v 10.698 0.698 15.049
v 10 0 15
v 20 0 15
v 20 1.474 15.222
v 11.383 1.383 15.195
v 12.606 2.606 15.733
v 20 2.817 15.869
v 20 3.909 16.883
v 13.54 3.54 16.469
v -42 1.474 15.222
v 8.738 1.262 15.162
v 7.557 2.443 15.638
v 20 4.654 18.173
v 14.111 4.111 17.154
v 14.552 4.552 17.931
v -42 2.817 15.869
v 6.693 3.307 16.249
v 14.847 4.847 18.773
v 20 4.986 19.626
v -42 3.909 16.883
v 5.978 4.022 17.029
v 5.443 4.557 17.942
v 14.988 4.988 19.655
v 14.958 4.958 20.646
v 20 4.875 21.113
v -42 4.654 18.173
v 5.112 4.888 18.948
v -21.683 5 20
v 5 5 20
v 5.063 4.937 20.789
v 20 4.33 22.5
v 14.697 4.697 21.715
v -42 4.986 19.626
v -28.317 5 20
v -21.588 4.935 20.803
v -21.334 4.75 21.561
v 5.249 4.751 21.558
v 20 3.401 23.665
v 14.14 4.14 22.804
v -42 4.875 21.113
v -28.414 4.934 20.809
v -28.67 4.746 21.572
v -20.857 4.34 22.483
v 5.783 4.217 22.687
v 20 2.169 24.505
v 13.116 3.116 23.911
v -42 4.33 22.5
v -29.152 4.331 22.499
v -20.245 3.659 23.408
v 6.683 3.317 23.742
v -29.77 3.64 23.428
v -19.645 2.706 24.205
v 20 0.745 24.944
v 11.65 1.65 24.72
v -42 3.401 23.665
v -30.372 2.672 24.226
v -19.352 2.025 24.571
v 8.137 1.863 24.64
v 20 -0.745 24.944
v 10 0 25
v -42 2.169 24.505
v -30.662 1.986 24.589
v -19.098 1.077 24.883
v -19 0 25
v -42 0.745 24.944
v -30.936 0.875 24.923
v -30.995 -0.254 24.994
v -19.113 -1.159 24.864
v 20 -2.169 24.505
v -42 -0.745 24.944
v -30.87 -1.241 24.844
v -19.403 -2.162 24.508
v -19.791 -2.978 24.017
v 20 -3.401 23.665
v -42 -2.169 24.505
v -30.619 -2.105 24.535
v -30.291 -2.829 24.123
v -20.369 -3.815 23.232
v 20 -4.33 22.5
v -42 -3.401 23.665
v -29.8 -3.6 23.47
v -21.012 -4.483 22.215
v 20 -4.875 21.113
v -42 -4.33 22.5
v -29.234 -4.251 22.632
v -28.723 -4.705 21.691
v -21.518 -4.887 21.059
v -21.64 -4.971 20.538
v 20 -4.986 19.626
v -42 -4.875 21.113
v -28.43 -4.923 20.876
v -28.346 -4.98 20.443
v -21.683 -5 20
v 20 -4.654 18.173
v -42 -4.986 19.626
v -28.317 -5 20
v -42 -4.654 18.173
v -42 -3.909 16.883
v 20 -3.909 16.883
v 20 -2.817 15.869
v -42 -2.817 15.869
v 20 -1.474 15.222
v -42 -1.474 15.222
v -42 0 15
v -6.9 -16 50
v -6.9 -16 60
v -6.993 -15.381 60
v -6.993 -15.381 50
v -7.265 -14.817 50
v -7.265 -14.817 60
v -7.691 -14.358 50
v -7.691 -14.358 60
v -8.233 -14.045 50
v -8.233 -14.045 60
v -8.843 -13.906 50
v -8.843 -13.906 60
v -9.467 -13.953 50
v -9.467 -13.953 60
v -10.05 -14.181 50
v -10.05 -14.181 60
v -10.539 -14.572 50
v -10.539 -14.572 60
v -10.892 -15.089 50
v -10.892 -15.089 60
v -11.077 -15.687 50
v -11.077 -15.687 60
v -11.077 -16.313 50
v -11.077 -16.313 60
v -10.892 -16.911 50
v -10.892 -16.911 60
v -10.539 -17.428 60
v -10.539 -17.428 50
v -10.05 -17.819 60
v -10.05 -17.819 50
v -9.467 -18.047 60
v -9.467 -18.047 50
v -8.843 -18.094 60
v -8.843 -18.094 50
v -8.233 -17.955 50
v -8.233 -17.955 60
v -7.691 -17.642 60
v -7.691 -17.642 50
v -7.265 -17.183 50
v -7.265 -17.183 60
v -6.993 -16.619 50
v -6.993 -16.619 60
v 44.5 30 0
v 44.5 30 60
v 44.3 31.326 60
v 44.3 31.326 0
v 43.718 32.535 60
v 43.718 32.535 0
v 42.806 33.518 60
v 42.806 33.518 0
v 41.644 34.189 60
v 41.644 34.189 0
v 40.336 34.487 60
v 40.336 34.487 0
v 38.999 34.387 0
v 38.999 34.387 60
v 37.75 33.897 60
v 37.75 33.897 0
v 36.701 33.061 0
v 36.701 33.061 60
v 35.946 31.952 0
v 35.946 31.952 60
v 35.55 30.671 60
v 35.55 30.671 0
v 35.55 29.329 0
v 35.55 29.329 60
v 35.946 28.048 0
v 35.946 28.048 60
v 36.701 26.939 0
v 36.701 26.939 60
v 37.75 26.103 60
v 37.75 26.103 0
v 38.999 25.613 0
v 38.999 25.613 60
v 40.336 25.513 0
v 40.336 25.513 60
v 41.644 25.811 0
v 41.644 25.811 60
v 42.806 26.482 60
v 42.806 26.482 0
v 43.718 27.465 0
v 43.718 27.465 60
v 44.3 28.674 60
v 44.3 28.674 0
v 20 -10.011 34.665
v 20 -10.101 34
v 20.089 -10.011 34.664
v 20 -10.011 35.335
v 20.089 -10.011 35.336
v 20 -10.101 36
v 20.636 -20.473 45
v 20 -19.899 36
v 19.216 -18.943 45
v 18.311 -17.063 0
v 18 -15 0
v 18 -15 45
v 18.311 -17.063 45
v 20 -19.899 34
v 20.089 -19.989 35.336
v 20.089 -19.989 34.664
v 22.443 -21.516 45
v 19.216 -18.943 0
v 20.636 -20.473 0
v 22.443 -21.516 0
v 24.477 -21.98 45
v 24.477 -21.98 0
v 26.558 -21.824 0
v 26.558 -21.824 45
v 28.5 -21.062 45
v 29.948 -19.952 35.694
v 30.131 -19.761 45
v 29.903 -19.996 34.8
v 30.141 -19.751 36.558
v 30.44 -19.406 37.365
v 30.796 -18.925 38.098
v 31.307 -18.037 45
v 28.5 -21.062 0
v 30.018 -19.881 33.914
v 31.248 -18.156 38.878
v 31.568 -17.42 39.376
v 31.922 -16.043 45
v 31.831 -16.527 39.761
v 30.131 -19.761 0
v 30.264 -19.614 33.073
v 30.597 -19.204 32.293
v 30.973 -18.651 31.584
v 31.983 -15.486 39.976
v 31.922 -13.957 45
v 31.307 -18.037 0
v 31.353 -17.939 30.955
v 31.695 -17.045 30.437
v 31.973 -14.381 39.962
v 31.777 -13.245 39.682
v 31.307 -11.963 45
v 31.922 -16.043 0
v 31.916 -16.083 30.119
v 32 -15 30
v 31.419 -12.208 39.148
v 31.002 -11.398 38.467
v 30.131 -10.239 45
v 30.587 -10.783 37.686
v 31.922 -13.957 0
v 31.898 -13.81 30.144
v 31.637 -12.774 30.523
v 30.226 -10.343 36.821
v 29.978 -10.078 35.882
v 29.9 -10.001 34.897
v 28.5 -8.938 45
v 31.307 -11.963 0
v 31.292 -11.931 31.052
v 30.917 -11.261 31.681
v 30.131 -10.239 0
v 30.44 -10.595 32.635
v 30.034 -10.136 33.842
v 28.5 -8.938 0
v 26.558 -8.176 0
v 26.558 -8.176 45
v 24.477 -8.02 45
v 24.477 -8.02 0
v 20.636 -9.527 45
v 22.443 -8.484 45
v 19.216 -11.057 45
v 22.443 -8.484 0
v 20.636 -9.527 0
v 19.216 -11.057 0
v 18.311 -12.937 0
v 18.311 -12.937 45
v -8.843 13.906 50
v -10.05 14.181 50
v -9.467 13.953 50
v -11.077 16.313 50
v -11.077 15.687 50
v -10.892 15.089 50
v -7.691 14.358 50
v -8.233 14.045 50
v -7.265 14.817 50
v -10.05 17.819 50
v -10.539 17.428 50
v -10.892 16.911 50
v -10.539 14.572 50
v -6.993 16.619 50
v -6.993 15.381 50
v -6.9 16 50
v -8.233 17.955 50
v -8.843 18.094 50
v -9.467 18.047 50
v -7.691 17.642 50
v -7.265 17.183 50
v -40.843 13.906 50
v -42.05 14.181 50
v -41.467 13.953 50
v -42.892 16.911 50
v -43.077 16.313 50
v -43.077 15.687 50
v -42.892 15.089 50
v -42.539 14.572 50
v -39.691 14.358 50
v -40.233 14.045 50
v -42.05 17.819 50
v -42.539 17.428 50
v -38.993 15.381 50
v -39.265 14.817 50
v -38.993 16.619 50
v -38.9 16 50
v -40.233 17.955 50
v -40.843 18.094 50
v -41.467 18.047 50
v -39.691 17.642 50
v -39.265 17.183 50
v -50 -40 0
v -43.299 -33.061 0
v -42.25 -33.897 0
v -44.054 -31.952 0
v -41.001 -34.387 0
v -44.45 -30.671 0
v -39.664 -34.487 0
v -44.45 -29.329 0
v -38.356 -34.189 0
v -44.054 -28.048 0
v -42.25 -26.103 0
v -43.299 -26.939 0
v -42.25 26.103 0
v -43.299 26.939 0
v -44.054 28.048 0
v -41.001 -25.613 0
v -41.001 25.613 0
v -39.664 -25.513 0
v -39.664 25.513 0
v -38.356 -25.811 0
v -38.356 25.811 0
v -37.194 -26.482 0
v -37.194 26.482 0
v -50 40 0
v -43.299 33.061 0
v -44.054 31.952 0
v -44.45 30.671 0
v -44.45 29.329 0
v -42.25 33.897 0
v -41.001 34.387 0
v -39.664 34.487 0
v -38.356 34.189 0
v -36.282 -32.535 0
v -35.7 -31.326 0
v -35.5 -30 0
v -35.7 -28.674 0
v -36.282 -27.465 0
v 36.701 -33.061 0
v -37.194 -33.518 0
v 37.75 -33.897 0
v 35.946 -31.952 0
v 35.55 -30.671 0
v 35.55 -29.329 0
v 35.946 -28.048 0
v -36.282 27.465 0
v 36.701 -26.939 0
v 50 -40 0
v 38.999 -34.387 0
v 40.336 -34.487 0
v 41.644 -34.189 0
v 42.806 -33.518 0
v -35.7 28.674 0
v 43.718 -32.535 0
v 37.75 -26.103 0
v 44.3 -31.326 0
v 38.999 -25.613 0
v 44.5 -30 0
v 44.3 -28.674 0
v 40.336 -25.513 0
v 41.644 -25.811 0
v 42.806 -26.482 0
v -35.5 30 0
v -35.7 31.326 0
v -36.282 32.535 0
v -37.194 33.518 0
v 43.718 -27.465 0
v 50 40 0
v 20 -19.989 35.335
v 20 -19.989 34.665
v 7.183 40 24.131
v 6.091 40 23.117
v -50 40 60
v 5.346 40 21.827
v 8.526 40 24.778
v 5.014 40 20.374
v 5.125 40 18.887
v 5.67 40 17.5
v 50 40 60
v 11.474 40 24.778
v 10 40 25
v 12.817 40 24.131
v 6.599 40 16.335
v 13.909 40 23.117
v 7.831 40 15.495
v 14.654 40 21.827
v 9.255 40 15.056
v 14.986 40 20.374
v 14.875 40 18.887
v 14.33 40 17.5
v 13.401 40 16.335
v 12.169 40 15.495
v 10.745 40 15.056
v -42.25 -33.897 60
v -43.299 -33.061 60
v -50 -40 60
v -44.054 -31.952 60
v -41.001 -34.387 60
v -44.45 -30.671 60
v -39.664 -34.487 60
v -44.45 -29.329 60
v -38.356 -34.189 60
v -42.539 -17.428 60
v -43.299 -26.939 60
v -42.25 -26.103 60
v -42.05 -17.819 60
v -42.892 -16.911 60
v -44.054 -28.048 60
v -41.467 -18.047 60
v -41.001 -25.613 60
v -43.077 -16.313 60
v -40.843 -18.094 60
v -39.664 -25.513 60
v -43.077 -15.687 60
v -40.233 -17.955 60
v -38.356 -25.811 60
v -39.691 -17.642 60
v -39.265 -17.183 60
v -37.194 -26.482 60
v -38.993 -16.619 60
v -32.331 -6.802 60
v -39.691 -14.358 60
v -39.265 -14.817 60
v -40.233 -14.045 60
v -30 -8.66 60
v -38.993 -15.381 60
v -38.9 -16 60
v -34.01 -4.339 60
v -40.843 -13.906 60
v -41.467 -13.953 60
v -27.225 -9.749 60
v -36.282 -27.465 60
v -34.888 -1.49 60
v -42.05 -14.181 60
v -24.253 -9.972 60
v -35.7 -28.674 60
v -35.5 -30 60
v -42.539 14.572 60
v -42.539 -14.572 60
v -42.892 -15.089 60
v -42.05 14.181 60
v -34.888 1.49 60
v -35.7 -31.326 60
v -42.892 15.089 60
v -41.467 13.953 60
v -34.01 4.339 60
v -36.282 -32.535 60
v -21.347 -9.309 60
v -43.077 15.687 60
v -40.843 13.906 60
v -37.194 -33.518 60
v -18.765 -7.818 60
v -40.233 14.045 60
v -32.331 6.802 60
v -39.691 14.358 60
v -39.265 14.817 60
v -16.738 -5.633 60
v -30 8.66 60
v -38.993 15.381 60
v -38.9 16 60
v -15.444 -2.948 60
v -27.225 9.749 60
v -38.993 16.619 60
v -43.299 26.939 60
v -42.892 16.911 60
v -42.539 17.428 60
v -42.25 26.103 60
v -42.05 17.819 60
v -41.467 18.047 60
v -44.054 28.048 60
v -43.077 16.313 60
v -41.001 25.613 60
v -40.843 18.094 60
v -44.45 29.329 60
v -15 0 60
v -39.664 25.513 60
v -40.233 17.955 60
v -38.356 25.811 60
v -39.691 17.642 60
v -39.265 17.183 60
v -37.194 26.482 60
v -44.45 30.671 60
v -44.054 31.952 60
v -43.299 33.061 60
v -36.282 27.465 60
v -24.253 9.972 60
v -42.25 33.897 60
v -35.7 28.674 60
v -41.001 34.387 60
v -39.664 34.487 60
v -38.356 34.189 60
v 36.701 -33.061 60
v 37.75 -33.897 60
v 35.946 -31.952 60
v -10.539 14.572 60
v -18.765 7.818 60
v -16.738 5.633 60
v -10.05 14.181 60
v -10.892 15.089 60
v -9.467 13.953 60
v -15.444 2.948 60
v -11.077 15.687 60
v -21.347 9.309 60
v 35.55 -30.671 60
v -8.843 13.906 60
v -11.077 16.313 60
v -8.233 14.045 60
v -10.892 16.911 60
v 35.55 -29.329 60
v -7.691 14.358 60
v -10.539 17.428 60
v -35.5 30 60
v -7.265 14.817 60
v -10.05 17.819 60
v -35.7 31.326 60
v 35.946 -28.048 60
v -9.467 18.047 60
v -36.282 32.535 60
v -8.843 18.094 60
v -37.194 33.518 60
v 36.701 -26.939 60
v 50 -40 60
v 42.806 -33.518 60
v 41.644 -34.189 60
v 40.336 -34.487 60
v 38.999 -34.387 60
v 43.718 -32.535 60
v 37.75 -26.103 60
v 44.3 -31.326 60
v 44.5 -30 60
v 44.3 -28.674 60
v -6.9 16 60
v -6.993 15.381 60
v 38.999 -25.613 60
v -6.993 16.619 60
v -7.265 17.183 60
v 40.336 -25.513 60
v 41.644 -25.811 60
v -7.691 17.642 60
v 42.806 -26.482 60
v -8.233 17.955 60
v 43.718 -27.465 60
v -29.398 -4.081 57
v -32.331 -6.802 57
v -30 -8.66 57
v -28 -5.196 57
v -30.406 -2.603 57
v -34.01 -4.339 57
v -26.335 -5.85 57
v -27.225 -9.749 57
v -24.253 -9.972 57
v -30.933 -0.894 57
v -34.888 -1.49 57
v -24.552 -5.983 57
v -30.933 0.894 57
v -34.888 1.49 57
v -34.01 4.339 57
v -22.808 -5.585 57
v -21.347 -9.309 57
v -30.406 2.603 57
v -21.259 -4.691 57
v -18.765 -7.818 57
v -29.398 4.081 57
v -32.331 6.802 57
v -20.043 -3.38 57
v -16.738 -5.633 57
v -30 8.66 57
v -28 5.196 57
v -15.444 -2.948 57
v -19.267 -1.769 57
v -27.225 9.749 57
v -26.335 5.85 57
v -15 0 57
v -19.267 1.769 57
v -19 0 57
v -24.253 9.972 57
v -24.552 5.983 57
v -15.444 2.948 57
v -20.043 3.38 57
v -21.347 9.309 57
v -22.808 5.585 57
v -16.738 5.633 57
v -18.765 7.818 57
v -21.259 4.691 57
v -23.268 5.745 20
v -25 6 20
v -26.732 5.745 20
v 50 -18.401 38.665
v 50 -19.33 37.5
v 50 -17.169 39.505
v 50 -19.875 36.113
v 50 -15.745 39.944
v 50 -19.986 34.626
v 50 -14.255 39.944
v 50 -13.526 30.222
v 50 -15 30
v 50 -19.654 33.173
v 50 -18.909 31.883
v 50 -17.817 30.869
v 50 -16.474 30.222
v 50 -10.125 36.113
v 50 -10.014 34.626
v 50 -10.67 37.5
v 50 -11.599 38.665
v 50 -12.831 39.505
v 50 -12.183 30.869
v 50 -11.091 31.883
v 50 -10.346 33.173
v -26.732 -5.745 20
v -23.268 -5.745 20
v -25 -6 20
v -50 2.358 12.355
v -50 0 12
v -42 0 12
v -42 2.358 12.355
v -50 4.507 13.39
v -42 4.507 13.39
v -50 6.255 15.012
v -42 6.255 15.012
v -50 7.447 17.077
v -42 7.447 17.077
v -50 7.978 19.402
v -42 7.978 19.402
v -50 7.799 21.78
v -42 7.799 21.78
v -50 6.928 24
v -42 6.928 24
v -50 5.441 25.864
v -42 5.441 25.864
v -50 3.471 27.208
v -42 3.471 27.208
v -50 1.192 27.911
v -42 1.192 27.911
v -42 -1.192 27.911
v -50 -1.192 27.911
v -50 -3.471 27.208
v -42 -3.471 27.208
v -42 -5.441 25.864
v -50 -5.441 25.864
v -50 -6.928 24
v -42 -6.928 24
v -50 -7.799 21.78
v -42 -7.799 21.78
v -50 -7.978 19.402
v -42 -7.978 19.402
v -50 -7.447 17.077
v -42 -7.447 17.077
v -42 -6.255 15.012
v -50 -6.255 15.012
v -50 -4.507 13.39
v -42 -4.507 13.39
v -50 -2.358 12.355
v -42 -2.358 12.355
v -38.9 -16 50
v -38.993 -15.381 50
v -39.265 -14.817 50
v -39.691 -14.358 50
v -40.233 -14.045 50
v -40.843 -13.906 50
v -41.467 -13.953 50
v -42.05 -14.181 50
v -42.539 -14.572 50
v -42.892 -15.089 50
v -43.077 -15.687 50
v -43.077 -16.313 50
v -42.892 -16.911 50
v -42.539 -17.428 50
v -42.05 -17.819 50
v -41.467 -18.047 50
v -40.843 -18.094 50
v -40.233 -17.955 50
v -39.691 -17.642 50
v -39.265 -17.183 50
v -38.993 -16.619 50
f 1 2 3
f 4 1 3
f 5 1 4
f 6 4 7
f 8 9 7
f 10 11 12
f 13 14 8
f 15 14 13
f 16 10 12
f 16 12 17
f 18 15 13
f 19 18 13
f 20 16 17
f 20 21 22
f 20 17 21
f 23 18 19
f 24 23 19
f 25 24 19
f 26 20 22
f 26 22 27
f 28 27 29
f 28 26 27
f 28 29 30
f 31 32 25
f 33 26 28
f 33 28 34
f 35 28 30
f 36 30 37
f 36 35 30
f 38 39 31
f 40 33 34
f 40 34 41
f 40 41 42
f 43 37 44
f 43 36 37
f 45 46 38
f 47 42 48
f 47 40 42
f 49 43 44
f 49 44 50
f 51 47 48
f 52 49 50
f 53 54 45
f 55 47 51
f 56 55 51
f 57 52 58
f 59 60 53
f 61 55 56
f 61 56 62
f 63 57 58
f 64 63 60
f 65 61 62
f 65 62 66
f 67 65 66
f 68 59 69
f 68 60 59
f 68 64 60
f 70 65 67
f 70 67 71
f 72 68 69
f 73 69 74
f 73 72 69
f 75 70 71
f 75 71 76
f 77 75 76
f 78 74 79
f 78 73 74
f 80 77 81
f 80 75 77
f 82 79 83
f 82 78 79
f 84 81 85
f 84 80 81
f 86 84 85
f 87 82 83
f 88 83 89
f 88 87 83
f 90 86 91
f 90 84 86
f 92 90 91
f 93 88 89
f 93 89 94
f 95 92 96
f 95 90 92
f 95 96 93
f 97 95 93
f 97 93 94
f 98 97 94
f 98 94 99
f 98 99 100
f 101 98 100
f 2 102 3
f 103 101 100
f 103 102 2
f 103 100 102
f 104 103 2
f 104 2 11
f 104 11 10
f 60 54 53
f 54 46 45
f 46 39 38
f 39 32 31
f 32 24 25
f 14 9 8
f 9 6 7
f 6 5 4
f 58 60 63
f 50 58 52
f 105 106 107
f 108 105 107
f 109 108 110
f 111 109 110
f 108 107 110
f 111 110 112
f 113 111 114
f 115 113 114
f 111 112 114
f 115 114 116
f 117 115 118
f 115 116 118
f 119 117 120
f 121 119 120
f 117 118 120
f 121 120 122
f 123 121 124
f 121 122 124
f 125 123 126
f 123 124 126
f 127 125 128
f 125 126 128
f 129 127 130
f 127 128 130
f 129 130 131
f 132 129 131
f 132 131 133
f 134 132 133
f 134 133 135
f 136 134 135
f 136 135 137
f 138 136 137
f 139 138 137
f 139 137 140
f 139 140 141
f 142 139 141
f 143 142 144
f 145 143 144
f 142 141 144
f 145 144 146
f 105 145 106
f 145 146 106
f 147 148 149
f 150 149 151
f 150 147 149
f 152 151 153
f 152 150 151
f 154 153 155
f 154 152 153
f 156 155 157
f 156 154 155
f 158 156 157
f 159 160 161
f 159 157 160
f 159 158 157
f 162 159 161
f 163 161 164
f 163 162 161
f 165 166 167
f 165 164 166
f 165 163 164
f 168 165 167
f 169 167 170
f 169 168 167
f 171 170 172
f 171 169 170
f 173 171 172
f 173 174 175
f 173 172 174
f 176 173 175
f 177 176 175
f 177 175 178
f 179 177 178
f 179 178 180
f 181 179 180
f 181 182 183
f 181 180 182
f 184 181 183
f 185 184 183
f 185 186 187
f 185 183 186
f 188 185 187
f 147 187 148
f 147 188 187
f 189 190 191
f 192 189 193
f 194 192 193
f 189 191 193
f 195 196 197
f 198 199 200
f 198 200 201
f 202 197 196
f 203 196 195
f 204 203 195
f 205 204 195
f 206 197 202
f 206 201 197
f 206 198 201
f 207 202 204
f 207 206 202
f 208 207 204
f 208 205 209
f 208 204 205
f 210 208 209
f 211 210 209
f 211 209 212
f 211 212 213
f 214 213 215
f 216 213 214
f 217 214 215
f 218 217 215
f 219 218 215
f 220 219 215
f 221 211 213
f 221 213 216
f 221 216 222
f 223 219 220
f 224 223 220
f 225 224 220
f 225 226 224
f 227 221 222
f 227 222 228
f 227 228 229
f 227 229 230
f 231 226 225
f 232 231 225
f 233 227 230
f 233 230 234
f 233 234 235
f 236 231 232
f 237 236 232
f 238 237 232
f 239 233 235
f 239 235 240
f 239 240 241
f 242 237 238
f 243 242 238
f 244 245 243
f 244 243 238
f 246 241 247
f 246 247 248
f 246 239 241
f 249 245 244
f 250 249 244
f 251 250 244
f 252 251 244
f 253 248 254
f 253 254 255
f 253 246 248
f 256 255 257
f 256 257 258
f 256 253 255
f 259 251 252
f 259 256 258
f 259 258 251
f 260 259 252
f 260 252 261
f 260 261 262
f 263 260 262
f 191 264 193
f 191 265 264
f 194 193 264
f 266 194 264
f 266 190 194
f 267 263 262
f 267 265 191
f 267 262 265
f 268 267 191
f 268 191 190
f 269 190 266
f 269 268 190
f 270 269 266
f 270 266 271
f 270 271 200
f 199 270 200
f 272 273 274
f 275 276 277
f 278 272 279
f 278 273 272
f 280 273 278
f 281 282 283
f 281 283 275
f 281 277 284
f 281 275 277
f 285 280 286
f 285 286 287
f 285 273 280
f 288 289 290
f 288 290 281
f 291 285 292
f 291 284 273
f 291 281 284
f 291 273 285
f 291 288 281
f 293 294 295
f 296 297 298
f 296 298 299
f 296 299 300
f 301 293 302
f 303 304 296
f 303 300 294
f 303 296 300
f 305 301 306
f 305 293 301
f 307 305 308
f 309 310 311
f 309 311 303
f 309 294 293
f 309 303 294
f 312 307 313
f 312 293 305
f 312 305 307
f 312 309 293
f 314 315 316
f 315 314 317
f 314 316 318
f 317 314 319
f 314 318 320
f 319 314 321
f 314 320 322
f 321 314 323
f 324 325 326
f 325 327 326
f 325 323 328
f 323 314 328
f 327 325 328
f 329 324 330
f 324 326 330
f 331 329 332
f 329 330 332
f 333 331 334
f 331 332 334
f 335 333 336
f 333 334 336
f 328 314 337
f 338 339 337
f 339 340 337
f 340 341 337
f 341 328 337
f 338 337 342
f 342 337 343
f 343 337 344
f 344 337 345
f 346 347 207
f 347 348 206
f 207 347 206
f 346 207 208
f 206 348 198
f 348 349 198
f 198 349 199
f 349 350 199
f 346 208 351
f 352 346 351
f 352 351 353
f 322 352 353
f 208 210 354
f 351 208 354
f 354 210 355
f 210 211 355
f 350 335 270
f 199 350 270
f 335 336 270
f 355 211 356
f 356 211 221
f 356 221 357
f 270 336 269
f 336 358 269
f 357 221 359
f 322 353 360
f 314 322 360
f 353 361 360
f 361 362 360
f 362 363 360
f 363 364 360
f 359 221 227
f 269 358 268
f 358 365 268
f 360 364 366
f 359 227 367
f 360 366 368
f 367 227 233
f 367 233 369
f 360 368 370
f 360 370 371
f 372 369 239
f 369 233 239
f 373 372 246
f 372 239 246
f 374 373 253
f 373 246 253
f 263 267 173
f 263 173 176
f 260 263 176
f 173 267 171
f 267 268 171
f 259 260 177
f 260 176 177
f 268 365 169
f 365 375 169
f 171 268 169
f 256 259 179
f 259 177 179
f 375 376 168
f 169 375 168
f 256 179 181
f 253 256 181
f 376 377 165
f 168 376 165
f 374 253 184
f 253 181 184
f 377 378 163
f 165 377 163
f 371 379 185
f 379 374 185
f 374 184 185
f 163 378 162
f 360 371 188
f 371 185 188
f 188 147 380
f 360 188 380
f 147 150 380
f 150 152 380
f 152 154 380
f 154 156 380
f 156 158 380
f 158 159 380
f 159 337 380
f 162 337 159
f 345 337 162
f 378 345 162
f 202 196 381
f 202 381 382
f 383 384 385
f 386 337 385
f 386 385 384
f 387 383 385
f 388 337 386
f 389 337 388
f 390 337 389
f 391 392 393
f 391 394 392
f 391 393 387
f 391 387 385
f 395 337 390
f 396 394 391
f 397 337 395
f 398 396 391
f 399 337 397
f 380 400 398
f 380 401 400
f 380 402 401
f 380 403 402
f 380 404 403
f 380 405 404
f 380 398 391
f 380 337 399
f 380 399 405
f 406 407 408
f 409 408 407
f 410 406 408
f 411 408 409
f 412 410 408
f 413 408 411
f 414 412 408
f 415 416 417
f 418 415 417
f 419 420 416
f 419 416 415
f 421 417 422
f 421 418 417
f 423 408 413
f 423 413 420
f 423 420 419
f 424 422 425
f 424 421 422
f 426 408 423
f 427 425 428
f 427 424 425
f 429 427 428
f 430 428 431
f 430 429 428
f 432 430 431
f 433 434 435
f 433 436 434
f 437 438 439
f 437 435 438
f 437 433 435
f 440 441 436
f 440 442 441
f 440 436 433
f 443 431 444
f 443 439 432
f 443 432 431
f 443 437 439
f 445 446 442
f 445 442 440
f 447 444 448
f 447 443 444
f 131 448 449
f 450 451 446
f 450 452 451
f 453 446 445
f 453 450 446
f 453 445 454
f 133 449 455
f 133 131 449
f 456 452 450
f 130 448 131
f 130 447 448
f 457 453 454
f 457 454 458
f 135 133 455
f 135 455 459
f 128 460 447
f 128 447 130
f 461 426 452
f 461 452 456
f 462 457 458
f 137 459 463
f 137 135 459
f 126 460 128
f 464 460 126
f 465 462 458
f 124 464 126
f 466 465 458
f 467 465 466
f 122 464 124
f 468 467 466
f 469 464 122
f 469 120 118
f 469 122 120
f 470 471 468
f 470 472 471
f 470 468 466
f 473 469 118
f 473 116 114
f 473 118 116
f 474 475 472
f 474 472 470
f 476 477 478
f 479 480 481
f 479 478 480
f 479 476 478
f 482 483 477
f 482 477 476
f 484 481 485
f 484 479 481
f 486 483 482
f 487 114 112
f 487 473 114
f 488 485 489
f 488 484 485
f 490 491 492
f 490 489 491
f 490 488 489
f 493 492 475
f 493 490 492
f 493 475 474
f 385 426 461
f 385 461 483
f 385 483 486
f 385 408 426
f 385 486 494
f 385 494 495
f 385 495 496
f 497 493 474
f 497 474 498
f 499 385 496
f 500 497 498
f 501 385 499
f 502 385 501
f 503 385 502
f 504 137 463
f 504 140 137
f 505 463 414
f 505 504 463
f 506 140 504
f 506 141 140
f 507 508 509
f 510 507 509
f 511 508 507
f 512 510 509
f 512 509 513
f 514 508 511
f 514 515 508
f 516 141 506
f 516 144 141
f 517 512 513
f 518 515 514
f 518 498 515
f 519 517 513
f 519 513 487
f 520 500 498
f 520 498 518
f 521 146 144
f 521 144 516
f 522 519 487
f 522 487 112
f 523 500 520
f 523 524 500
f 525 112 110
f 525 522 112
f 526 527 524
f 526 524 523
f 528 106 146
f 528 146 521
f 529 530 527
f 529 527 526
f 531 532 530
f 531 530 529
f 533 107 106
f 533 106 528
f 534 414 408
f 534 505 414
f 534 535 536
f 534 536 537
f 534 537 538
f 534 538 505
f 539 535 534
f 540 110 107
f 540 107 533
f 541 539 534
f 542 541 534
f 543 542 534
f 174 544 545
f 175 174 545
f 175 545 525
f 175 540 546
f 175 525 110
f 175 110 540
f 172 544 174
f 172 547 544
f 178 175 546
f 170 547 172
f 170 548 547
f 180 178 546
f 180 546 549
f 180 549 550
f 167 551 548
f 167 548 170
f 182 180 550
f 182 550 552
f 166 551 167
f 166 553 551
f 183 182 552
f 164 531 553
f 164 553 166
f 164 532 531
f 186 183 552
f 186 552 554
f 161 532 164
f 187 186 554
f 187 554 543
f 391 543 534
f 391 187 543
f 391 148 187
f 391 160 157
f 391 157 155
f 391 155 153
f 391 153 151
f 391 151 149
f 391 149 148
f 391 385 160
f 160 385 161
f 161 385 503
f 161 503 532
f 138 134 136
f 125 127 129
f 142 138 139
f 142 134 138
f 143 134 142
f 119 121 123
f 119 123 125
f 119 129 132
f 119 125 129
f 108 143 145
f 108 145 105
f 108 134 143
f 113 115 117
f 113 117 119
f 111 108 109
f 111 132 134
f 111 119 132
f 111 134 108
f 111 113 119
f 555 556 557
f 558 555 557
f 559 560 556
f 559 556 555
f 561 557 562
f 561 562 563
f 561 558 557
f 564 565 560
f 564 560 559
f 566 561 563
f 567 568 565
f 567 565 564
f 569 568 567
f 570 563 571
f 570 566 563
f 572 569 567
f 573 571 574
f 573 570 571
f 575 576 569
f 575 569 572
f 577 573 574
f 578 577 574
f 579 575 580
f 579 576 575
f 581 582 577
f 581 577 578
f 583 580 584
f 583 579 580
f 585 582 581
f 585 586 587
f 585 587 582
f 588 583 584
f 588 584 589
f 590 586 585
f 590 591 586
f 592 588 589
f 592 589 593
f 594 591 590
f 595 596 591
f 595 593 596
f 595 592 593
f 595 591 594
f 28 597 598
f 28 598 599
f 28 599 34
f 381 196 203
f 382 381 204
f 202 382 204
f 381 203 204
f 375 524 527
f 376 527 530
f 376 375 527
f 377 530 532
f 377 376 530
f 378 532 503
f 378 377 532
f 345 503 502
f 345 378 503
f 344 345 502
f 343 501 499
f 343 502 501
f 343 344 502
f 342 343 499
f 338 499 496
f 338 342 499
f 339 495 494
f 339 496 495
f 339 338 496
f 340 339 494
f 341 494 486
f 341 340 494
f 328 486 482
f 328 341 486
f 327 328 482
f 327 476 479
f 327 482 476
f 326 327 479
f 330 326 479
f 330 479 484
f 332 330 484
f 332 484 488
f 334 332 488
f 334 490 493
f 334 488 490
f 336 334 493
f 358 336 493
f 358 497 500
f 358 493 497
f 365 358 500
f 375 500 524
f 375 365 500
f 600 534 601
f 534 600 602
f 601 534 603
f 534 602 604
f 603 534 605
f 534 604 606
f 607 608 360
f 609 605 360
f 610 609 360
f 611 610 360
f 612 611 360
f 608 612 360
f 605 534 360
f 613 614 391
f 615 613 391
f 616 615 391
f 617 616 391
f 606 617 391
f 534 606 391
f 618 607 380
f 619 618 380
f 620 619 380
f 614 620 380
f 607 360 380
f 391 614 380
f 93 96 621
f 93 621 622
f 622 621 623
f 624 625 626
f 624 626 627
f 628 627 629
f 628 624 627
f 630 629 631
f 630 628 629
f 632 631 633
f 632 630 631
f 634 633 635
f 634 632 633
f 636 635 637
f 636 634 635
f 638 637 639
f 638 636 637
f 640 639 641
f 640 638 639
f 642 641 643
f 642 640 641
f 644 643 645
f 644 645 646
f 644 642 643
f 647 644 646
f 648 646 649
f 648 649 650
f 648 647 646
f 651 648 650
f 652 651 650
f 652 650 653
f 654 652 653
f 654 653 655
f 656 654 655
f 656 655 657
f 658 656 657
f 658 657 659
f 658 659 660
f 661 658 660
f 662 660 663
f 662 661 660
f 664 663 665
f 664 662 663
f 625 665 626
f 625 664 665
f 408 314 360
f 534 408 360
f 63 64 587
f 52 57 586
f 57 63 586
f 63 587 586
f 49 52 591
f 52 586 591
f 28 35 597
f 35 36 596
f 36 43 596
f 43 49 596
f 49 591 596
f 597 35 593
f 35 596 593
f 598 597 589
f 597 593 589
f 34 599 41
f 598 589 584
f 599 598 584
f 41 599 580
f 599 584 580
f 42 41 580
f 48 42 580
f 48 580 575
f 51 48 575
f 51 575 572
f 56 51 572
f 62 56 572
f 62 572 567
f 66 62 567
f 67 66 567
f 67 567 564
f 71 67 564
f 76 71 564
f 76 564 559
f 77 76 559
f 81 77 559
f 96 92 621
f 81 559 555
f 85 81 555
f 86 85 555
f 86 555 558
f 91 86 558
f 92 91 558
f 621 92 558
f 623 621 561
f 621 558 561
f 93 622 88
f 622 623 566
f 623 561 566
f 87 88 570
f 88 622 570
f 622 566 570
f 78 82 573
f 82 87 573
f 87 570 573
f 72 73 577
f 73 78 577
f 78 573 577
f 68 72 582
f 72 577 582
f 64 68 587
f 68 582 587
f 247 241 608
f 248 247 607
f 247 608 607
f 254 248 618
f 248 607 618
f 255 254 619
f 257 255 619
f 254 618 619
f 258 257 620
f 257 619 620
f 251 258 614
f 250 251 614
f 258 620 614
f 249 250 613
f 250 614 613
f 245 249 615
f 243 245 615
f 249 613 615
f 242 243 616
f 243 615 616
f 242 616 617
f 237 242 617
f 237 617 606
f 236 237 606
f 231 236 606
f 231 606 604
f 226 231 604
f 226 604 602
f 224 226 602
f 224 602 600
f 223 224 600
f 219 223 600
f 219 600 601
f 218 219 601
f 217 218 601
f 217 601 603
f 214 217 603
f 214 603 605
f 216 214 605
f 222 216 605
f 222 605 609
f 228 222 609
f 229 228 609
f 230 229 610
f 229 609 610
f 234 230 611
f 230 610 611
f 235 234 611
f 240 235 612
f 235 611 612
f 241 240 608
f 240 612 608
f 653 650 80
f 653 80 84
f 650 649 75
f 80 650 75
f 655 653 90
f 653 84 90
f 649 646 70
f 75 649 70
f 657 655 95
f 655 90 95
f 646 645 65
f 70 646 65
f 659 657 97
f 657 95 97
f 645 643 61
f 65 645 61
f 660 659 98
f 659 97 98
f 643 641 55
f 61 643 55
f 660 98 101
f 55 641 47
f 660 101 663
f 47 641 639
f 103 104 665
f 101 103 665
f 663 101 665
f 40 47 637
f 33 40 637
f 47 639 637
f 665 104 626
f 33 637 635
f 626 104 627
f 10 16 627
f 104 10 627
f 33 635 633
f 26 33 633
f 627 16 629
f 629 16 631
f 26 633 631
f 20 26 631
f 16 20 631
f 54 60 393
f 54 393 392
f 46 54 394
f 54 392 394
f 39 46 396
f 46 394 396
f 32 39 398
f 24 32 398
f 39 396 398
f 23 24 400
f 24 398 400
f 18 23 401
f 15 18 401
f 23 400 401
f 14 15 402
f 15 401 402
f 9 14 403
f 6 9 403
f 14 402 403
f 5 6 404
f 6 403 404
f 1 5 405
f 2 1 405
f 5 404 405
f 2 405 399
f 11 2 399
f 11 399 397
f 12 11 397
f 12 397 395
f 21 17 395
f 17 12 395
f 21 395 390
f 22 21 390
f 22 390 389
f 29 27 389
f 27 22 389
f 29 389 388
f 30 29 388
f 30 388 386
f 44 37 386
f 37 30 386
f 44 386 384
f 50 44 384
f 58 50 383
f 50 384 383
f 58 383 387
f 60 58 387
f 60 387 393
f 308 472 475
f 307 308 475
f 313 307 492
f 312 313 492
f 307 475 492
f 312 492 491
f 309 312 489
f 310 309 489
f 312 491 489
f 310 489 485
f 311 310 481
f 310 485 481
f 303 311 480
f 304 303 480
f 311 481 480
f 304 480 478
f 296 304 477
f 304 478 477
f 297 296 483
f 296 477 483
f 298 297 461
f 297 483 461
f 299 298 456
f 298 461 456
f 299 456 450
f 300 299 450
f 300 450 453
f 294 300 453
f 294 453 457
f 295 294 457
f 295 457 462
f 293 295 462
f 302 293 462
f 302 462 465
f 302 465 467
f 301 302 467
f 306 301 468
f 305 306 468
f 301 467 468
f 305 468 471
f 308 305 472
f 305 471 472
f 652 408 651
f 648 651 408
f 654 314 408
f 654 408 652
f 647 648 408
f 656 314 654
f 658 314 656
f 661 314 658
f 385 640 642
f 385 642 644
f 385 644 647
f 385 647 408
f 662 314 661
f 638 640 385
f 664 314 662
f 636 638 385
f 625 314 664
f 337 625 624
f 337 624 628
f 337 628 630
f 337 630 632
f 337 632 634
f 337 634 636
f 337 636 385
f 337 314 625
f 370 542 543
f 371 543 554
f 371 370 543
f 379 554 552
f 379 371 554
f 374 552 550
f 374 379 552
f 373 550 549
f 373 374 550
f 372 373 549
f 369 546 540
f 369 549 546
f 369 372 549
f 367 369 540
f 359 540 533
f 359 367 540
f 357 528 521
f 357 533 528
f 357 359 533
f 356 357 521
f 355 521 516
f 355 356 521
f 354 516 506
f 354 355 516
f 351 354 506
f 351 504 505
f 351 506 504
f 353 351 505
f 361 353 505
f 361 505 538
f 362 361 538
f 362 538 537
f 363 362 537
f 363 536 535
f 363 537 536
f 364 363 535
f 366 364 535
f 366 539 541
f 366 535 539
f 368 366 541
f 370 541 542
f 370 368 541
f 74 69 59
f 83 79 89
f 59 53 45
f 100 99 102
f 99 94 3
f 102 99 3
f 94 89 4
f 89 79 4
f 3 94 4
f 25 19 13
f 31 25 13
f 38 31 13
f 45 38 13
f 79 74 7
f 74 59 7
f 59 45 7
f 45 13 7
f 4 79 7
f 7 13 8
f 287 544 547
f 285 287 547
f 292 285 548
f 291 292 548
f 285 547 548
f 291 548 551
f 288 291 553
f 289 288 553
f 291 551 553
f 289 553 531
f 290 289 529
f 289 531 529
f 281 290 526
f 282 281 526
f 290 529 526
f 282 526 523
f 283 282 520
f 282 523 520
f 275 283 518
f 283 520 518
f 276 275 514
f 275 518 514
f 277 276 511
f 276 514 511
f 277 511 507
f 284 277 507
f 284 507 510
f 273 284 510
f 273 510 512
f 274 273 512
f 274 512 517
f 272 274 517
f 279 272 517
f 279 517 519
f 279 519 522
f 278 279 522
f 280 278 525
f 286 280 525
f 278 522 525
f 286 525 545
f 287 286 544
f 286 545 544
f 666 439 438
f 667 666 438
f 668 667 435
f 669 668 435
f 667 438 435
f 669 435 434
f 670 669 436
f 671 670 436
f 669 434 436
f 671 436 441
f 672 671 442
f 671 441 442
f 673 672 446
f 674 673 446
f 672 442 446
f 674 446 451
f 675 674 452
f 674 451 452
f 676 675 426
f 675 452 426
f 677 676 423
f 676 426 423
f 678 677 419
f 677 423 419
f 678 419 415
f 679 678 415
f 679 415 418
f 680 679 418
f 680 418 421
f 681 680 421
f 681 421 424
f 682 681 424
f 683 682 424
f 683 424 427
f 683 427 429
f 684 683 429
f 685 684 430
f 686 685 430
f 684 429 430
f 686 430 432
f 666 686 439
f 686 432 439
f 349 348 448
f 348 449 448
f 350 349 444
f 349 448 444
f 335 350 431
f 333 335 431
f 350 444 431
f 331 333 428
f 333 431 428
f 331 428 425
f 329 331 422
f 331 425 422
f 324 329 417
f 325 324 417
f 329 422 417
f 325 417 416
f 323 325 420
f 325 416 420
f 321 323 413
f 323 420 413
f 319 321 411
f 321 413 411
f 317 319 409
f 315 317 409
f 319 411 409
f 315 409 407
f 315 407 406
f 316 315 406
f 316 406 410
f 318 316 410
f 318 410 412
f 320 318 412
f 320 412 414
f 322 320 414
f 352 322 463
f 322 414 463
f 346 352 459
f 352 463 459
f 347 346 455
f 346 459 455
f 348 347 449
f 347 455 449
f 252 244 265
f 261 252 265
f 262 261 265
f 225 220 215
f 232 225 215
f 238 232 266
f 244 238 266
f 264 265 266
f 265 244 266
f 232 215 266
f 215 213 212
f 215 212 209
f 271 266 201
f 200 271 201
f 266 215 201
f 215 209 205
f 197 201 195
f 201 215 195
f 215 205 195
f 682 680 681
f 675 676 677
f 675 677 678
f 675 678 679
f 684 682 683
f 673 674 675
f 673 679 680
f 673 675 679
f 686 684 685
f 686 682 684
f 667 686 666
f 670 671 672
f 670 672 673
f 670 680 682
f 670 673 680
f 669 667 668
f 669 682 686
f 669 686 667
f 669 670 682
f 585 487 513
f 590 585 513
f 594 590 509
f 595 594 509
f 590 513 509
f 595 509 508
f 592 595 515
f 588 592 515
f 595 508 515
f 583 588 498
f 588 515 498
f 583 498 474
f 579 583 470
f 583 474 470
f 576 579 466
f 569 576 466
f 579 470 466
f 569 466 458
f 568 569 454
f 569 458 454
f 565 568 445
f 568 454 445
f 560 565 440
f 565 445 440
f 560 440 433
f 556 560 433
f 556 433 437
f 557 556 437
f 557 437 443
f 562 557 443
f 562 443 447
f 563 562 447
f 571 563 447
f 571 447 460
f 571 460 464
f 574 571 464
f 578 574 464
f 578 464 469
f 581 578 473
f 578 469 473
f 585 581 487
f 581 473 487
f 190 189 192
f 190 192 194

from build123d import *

# Parameters (mm, degrees)
SKETCH_1_W          = 100
SKETCH_1_H          = 80
EXTRUDE_1_DEPTH     = 60
SKETCH_2_R          = 10
CUT_EXTRUDE_1_DEPTH = 3
SKETCH_3_R          = 6
CUT_EXTRUDE_2_DEPTH = 40
SKETCH_4_R          = 8
CUT_EXTRUDE_3_DEPTH = 8
SKETCH_5_R          = 5
CUT_EXTRUDE_4_DEPTH = 70
SKETCH_6_R          = 5
CUT_EXTRUDE_5_DEPTH = 40
SKETCH_7_R          = 7
CUT_EXTRUDE_6_DEPTH = 45
SKETCH_8_R          = 5
CUT_EXTRUDE_7_DEPTH = 30
SKETCH_9_R          = 4.5
CUT_EXTRUDE_8_DEPTH = 101
SKETCH_10_R         = 2.1
CUT_EXTRUDE_9_DEPTH = 10


with BuildPart() as part:
    # 草图1 → 凸台-拉伸1 (new body)
    with BuildSketch(Plane.XY):
        Rectangle(SKETCH_1_W, SKETCH_1_H)
    extrude(amount=EXTRUDE_1_DEPTH)

    # 草图2 → 切除-拉伸1 (cut)
    with BuildSketch(Plane.XY.offset(60)):
        with Locations((-25, 0)):
            Circle(SKETCH_2_R)
    extrude(amount=-CUT_EXTRUDE_1_DEPTH, mode=Mode.SUBTRACT)

    # 草图3 → 切除-拉伸2 (cut)
    with BuildSketch(Plane.XY.offset(60)):
        with Locations((-25, 0)):
            Circle(SKETCH_3_R)
    extrude(amount=-CUT_EXTRUDE_2_DEPTH, mode=Mode.SUBTRACT)

    # 草图4 → 切除-拉伸3 (cut)
    with BuildSketch(Plane(origin=(-50, 0, 0), x_dir=(0, 0, -1), z_dir=(1, 0, 0))):
        with Locations((-20, 0)):
            Circle(SKETCH_4_R)
    extrude(amount=CUT_EXTRUDE_3_DEPTH, mode=Mode.SUBTRACT)

    # 草图5 → 切除-拉伸4 (cut)
    with BuildSketch(Plane(origin=(-50, 0, 0), x_dir=(0, 0, -1), z_dir=(1, 0, 0))):
        with Locations((-20, 0)):
            Circle(SKETCH_5_R)
    extrude(amount=CUT_EXTRUDE_4_DEPTH, mode=Mode.SUBTRACT)

    # 草图6 → 切除-拉伸5 (cut)
    with BuildSketch(Plane(origin=(0, 40, 0), x_dir=(1, 0, 0), z_dir=(0, 1, 0))):
        with Locations(Location((10, -20, 0), (0, 0, 270))):
            Circle(SKETCH_6_R)
    extrude(amount=-CUT_EXTRUDE_5_DEPTH, mode=Mode.SUBTRACT)

    # 草图7 → 切除-拉伸6 (cut)
    with BuildSketch(Plane.XY):
        with Locations(Location((25, -15, 0), (0, 0, 180))):
            Circle(SKETCH_7_R)
    extrude(amount=CUT_EXTRUDE_6_DEPTH, mode=Mode.SUBTRACT)

    # 草图8 → 切除-拉伸7 (cut)
    with BuildSketch(Plane(origin=(50, 0, 0), x_dir=(0, 0, -1), z_dir=(1, 0, 0))):
        with Locations((-35, -15)):
            Circle(SKETCH_8_R)
    extrude(amount=-CUT_EXTRUDE_7_DEPTH, mode=Mode.SUBTRACT)

    # 草图9 → 切除-拉伸8 (cut, symmetric)
    with BuildSketch(Plane.XY):
        with Locations((40, 30)):
            Circle(SKETCH_9_R)
        with Locations((40, -30)):
            Circle(SKETCH_9_R)
        with Locations((-40, 30)):
            Circle(SKETCH_9_R)
        with Locations((-40, -30)):
            Circle(SKETCH_9_R)
    extrude(amount=CUT_EXTRUDE_8_DEPTH, both=True, mode=Mode.SUBTRACT)

    # 草图10 → 切除-拉伸9 (cut)
    with BuildSketch(Plane.XY.offset(60)):
        with Locations((-9, 16)):
            Circle(SKETCH_10_R)
        with Locations((-9, -16)):
            Circle(SKETCH_10_R)
        with Locations((-41, 16)):
            Circle(SKETCH_10_R)
        with Locations((-41, -16)):
            Circle(SKETCH_10_R)
    extrude(amount=-CUT_EXTRUDE_9_DEPTH, mode=Mode.SUBTRACT)


solid = part.part
